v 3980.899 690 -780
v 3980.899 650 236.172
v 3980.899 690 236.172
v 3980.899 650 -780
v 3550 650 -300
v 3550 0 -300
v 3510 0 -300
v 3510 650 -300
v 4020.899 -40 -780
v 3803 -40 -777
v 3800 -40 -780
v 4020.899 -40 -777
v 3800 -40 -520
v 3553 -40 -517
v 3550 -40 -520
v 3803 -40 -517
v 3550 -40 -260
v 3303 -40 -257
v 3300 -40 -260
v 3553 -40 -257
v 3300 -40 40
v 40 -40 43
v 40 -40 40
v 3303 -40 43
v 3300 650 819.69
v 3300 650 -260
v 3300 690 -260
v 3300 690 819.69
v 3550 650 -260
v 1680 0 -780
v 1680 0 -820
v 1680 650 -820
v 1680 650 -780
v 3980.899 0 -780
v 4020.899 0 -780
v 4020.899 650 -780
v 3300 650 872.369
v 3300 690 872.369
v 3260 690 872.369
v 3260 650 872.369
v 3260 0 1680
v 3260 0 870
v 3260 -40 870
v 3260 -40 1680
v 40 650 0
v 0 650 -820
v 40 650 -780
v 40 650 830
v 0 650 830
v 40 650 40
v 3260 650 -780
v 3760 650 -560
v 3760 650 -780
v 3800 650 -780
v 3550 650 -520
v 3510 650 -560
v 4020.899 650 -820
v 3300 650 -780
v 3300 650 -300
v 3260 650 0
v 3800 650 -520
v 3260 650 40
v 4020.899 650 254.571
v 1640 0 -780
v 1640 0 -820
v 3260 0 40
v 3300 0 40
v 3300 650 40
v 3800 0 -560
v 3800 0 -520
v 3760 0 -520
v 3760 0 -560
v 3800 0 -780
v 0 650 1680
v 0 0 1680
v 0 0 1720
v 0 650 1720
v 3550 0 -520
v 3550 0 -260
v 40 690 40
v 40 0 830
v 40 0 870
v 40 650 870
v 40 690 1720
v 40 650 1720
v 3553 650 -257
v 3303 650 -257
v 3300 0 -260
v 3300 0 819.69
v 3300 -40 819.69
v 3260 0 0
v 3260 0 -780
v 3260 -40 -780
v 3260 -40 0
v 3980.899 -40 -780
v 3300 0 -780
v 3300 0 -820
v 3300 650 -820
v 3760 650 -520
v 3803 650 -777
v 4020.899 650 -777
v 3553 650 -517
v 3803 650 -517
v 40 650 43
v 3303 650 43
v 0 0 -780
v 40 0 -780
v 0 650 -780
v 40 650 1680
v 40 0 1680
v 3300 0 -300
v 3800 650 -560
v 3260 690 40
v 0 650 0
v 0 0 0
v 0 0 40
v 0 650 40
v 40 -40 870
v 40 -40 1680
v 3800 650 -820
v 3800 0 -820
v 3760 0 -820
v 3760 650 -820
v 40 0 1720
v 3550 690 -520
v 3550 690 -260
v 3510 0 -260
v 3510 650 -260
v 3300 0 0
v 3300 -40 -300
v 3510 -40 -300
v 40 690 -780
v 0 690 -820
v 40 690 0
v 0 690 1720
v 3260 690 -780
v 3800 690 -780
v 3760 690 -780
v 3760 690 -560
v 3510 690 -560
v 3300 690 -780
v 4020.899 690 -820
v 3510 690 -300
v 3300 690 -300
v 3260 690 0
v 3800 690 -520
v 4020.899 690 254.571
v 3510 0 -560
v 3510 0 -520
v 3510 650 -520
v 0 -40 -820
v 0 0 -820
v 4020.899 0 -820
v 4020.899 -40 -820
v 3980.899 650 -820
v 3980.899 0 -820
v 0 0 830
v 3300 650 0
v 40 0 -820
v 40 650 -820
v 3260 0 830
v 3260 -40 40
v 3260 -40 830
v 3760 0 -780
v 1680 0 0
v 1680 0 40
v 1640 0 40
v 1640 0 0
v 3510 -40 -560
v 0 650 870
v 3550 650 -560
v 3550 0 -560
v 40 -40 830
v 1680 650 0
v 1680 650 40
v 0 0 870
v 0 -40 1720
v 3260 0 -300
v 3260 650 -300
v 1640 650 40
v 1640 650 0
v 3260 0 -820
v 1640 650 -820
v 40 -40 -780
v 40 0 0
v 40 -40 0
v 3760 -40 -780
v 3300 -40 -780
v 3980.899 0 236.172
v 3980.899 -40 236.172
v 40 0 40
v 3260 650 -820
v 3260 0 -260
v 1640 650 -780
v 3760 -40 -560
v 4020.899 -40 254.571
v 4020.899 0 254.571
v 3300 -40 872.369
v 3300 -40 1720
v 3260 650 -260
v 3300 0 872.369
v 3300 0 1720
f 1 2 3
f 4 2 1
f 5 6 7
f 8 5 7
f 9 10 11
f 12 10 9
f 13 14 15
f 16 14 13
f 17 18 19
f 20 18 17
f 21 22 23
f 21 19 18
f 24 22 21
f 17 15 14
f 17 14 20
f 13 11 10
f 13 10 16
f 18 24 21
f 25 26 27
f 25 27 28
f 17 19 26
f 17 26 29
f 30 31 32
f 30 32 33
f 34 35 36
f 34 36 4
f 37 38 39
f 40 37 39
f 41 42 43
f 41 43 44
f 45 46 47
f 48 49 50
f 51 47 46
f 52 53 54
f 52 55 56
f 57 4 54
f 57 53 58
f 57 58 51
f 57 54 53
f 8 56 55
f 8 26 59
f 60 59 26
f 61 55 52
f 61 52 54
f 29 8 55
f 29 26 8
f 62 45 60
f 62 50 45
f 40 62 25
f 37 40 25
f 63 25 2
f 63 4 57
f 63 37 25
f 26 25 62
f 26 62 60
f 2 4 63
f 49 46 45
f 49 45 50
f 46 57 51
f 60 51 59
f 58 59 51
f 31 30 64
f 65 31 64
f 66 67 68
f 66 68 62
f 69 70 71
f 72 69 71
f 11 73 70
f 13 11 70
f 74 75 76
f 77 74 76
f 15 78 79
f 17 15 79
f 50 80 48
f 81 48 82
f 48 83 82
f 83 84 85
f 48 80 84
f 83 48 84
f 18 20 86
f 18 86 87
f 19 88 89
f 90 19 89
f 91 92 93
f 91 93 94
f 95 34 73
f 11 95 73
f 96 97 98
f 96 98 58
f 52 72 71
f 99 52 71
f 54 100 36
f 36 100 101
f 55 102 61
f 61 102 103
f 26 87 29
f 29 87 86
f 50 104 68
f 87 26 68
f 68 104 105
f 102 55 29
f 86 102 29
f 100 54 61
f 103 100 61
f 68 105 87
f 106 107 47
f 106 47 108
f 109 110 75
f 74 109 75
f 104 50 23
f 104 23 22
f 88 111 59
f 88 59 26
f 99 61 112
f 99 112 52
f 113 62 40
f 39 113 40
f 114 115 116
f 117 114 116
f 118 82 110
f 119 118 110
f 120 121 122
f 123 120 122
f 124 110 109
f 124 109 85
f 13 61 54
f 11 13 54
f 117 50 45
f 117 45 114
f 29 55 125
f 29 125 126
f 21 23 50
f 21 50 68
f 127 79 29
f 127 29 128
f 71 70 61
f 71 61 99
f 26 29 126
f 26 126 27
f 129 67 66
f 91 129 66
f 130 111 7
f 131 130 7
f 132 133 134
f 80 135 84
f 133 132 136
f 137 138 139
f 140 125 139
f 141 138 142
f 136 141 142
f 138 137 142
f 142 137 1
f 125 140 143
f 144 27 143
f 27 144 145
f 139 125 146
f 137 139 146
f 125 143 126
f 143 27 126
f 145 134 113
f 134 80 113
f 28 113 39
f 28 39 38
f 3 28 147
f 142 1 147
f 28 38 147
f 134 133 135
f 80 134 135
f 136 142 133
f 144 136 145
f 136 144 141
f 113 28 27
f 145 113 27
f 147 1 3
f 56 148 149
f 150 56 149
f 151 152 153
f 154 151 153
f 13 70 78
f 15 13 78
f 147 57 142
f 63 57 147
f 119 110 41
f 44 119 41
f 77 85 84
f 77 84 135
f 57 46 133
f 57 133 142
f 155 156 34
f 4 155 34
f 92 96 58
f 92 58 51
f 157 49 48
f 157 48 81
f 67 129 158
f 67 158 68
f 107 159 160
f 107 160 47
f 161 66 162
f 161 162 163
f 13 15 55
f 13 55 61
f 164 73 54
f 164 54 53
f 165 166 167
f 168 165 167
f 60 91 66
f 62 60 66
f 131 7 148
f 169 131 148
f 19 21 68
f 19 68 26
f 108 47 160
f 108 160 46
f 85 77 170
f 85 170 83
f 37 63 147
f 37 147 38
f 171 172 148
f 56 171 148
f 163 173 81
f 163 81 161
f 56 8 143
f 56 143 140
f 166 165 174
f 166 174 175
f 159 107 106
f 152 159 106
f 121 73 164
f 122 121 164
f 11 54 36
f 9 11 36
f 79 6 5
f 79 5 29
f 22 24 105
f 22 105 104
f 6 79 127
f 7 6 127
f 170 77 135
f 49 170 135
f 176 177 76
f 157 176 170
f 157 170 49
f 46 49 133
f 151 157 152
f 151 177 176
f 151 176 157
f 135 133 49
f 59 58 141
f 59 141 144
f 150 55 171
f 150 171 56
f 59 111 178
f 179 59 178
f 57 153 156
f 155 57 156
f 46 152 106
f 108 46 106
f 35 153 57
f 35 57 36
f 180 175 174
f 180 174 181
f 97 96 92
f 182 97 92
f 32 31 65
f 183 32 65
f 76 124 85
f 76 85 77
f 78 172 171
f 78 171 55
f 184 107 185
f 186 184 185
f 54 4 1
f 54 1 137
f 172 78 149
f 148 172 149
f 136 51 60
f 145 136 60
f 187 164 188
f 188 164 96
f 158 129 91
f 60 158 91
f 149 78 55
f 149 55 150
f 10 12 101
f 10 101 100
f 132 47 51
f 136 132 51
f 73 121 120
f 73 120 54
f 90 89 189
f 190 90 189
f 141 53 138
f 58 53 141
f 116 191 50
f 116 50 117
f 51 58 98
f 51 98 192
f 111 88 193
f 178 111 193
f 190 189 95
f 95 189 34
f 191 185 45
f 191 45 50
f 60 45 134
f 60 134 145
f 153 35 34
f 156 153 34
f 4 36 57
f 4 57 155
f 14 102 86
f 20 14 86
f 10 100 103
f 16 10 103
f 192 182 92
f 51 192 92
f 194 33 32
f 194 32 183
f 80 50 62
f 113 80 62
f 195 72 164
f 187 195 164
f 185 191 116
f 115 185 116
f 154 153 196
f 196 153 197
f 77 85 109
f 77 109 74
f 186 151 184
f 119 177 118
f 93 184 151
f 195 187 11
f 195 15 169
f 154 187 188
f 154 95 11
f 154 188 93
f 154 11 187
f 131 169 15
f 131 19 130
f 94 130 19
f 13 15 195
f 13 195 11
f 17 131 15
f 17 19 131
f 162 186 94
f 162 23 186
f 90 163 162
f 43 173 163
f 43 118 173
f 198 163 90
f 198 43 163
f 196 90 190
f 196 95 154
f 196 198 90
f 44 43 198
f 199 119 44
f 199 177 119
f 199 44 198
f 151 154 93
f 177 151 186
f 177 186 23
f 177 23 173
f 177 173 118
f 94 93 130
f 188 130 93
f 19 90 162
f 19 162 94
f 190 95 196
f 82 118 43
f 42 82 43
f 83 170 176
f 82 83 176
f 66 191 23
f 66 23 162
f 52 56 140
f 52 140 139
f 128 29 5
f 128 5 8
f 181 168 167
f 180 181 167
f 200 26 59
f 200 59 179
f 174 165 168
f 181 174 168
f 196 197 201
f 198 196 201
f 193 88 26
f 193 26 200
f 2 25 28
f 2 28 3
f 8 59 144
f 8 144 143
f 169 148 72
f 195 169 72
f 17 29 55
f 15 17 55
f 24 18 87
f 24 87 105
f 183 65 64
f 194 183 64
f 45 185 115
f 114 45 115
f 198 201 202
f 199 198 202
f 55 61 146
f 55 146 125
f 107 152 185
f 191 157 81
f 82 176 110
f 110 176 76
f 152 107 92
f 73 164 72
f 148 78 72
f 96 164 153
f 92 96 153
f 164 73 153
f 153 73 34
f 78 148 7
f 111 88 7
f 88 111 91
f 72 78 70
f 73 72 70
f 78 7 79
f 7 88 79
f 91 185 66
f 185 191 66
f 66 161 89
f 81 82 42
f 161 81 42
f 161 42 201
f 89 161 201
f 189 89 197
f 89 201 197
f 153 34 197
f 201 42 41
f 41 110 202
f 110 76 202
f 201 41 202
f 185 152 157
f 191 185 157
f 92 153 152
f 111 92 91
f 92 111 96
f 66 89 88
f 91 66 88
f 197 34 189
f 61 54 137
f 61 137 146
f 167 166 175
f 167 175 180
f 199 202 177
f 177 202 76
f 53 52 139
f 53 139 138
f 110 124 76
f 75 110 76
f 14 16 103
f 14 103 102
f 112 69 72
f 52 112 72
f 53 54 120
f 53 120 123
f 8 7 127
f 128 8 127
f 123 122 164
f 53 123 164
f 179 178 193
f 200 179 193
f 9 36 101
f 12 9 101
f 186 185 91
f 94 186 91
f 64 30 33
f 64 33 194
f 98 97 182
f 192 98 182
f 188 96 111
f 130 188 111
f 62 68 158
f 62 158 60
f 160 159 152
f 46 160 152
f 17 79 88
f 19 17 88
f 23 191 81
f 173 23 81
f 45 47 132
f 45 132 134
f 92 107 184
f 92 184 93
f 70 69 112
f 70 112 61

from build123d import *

# Parameters (mm, degrees)
F0_W      = 3220
F0_H      = 780
F0_H_2    = 1640
F1_DEPTH  = 40
F2_W      = 40
F2_H      = 40
F3_DEPTH  = 650
F6_W      = 3220
F6_H      = 3
F6_W_2    = 40
F7_DEPTH  = 690
F8_W      = 40
F8_H      = 807.6308862525
F9_DEPTH  = 40
F10_W     = 3220
F10_H     = 40
F11_DEPTH = 40
F12_W     = 664.210498333
F12_H     = 40
F13_DEPTH = 40


with BuildPart() as f1:
    # F0 (on Front) → F1 (new body)
    with BuildSketch(Plane.XZ):
        Polygon((0, -820), (3300, -820), (4020.8986186981, -820), (4020.8986186981, 254.5713696399), (3300, 872.3691137475), (3300, 1720), (0, 1720), (0, 40), (0, 0), align=None)
        with Locations((1650, -390)):
            Rectangle(F0_W, F0_H, mode=Mode.SUBTRACT)
        Polygon((3760, -780), (3300, -780), (3300, -300), (3510, -300), (3510, -560), (3760, -560), align=None, mode=Mode.SUBTRACT)
        Polygon((3300, 0), (3300, 40), (3300, 819.6901679039), (3980.8986186981, 236.1717373133), (3980.8986186981, -780), (3800, -780), (3800, -520), (3550, -520), (3550, -260), (3300, -260), align=None, mode=Mode.SUBTRACT)
        with Locations((1650, 860)):
            Rectangle(F0_W, F0_H_2, mode=Mode.SUBTRACT)
    extrude(amount=F1_DEPTH)


with BuildPart() as f3:
    # F2 (on face) → F3 (new body)
    with BuildSketch(Plane(origin=(0, 0, 0), x_dir=(-1, 0, 0), z_dir=(0, 1, 0))):
        with Locations((-20, 1700)):
            Rectangle(F2_W, F2_H)
    extrude(amount=F3_DEPTH)


with BuildPart() as f3b:
    # F2 (on face) → F3, piece 2 (new body)
    with BuildSketch(Plane(origin=(0, 0, 0), x_dir=(-1, 0, 0), z_dir=(0, 1, 0))):
        with Locations((-20, 20)):
            Rectangle(F2_W, F2_H)
    extrude(amount=F3_DEPTH)


with BuildPart() as f3c:
    # F2 (on face) → F3, piece 3 (new body)
    with BuildSketch(Plane(origin=(0, 0, 0), x_dir=(-1, 0, 0), z_dir=(0, 1, 0))):
        with Locations((-20, -800)):
            Rectangle(F2_W, F2_H)
    extrude(amount=F3_DEPTH)


with BuildPart() as f3d:
    # F2 (on face) → F3, piece 4 (new body)
    with BuildSketch(Plane(origin=(0, 0, 0), x_dir=(-1, 0, 0), z_dir=(0, 1, 0))):
        with Locations((-1660, -800)):
            Rectangle(F2_W, F2_H)
    extrude(amount=F3_DEPTH)


with BuildPart() as f3e:
    # F2 (on face) → F3, piece 5 (new body)
    with BuildSketch(Plane(origin=(0, 0, 0), x_dir=(-1, 0, 0), z_dir=(0, 1, 0))):
        with Locations((-1660, 20)):
            Rectangle(F2_W, F2_H)
    extrude(amount=F3_DEPTH)


with BuildPart() as f3f:
    # F2 (on face) → F3, piece 6 (new body)
    with BuildSketch(Plane(origin=(0, 0, 0), x_dir=(-1, 0, 0), z_dir=(0, 1, 0))):
        with Locations((-3280, 20)):
            Rectangle(F2_W, F2_H)
    extrude(amount=F3_DEPTH)


with BuildPart() as f3g:
    # F2 (on face) → F3, piece 7 (new body)
    with BuildSketch(Plane(origin=(0, 0, 0), x_dir=(-1, 0, 0), z_dir=(0, 1, 0))):
        with Locations((-3280, -800)):
            Rectangle(F2_W, F2_H)
    extrude(amount=F3_DEPTH)


with BuildPart() as f3h:
    # F2 (on face) → F3, piece 8 (new body)
    with BuildSketch(Plane(origin=(0, 0, 0), x_dir=(-1, 0, 0), z_dir=(0, 1, 0))):
        with Locations((-3280, -280)):
            Rectangle(F2_W, F2_H)
    extrude(amount=F3_DEPTH)


with BuildPart() as f3i:
    # F2 (on face) → F3, piece 9 (new body)
    with BuildSketch(Plane(origin=(0, 0, 0), x_dir=(-1, 0, 0), z_dir=(0, 1, 0))):
        with Locations((-3530, -280)):
            Rectangle(F2_W, F2_H)
    extrude(amount=F3_DEPTH)


with BuildPart() as f3j:
    # F2 (on face) → F3, piece 10 (new body)
    with BuildSketch(Plane(origin=(0, 0, 0), x_dir=(-1, 0, 0), z_dir=(0, 1, 0))):
        with Locations((-3780, -540)):
            Rectangle(F2_W, F2_H)
    extrude(amount=F3_DEPTH)


with BuildPart() as f3k:
    # F2 (on face) → F3, piece 11 (new body)
    with BuildSketch(Plane(origin=(0, 0, 0), x_dir=(-1, 0, 0), z_dir=(0, 1, 0))):
        with Locations((-3530, -540)):
            Rectangle(F2_W, F2_H)
    extrude(amount=F3_DEPTH)


with BuildPart() as f3l:
    # F2 (on face) → F3, piece 12 (new body)
    with BuildSketch(Plane(origin=(0, 0, 0), x_dir=(-1, 0, 0), z_dir=(0, 1, 0))):
        with Locations((-3780, -800)):
            Rectangle(F2_W, F2_H)
    extrude(amount=F3_DEPTH)


with BuildPart() as f3m:
    # F2 (on face) → F3, piece 13 (new body)
    with BuildSketch(Plane(origin=(0, 0, 0), x_dir=(-1, 0, 0), z_dir=(0, 1, 0))):
        with Locations((-4000.8986186981, -800)):
            Rectangle(F2_W, F2_H)
    extrude(amount=F3_DEPTH)


with BuildPart() as f5_1:
    # F5: instance of F1
    add(f1.part.mirror(Plane(origin=(2064.0426238639, 325, 241.2959418139), x_dir=(1, 0, 0), z_dir=(0, 1, 0))))

    # F8 (on face) → F9 (cut)
    with BuildSketch(Plane(origin=(0, 690, 0), x_dir=(-1, 0, 0), z_dir=(0, 1, 0))):
        Polygon((-40, 1720), (-3300, 1720), (-3300, 1680), (-3260, 1680), (-40, 1680), align=None)
        with Locations((-3280, 1276.1845568738)):
            Rectangle(F8_W, F8_H)
    extrude(amount=-F9_DEPTH, mode=Mode.SUBTRACT)


with BuildPart() as f7:
    # F6 (on face) → F7 (new body)
    with BuildSketch(Plane.XZ.offset(40)):
        with Locations((1650, 41.5)):
            Rectangle(F6_W, F6_H)
        with Locations((3280, 41.5)):
            Rectangle(F6_W_2, F6_H)
        Polygon((3300, 43), (3300, 40), (3300, -260), (3550, -260), (3550, -520), (3800, -520), (3800, -780), (3980.8986186981, -780), (3980.8986186981, -777), (3803, -777), (3803, -517), (3553, -517), (3553, -257), (3303, -257), (3303, 43), align=None)
        with Locations((4000.8986186981, -778.5)):
            Rectangle(F6_W_2, F6_H)
    extrude(amount=-F7_DEPTH)


with BuildPart() as f1_1:
    add(f1.part)

    # F10 (on face) → F11 (join)
    with BuildSketch(Plane.XZ.offset(40)):
        with Locations((1650, 850)):
            Rectangle(F10_W, F10_H)
    extrude(amount=-F11_DEPTH)

    add(f5_1.part)  # F13 merges F5_1
    # F12 (on face) → F13 (join)
    with BuildSketch(Plane(origin=(0, 0, 0), x_dir=(0, -1, 0), z_dir=(-1, 0, 0))):
        with Locations((-332.1052491665, 850)):
            Rectangle(F12_W, F12_H)
    extrude(amount=-F13_DEPTH)


solid = Compound([f3.part, f3b.part, f3c.part, f3d.part, f3e.part, f3f.part, f3g.part, f3h.part, f3i.part, f3j.part, f3k.part, f3l.part, f3m.part, f7.part, f1_1.part])
